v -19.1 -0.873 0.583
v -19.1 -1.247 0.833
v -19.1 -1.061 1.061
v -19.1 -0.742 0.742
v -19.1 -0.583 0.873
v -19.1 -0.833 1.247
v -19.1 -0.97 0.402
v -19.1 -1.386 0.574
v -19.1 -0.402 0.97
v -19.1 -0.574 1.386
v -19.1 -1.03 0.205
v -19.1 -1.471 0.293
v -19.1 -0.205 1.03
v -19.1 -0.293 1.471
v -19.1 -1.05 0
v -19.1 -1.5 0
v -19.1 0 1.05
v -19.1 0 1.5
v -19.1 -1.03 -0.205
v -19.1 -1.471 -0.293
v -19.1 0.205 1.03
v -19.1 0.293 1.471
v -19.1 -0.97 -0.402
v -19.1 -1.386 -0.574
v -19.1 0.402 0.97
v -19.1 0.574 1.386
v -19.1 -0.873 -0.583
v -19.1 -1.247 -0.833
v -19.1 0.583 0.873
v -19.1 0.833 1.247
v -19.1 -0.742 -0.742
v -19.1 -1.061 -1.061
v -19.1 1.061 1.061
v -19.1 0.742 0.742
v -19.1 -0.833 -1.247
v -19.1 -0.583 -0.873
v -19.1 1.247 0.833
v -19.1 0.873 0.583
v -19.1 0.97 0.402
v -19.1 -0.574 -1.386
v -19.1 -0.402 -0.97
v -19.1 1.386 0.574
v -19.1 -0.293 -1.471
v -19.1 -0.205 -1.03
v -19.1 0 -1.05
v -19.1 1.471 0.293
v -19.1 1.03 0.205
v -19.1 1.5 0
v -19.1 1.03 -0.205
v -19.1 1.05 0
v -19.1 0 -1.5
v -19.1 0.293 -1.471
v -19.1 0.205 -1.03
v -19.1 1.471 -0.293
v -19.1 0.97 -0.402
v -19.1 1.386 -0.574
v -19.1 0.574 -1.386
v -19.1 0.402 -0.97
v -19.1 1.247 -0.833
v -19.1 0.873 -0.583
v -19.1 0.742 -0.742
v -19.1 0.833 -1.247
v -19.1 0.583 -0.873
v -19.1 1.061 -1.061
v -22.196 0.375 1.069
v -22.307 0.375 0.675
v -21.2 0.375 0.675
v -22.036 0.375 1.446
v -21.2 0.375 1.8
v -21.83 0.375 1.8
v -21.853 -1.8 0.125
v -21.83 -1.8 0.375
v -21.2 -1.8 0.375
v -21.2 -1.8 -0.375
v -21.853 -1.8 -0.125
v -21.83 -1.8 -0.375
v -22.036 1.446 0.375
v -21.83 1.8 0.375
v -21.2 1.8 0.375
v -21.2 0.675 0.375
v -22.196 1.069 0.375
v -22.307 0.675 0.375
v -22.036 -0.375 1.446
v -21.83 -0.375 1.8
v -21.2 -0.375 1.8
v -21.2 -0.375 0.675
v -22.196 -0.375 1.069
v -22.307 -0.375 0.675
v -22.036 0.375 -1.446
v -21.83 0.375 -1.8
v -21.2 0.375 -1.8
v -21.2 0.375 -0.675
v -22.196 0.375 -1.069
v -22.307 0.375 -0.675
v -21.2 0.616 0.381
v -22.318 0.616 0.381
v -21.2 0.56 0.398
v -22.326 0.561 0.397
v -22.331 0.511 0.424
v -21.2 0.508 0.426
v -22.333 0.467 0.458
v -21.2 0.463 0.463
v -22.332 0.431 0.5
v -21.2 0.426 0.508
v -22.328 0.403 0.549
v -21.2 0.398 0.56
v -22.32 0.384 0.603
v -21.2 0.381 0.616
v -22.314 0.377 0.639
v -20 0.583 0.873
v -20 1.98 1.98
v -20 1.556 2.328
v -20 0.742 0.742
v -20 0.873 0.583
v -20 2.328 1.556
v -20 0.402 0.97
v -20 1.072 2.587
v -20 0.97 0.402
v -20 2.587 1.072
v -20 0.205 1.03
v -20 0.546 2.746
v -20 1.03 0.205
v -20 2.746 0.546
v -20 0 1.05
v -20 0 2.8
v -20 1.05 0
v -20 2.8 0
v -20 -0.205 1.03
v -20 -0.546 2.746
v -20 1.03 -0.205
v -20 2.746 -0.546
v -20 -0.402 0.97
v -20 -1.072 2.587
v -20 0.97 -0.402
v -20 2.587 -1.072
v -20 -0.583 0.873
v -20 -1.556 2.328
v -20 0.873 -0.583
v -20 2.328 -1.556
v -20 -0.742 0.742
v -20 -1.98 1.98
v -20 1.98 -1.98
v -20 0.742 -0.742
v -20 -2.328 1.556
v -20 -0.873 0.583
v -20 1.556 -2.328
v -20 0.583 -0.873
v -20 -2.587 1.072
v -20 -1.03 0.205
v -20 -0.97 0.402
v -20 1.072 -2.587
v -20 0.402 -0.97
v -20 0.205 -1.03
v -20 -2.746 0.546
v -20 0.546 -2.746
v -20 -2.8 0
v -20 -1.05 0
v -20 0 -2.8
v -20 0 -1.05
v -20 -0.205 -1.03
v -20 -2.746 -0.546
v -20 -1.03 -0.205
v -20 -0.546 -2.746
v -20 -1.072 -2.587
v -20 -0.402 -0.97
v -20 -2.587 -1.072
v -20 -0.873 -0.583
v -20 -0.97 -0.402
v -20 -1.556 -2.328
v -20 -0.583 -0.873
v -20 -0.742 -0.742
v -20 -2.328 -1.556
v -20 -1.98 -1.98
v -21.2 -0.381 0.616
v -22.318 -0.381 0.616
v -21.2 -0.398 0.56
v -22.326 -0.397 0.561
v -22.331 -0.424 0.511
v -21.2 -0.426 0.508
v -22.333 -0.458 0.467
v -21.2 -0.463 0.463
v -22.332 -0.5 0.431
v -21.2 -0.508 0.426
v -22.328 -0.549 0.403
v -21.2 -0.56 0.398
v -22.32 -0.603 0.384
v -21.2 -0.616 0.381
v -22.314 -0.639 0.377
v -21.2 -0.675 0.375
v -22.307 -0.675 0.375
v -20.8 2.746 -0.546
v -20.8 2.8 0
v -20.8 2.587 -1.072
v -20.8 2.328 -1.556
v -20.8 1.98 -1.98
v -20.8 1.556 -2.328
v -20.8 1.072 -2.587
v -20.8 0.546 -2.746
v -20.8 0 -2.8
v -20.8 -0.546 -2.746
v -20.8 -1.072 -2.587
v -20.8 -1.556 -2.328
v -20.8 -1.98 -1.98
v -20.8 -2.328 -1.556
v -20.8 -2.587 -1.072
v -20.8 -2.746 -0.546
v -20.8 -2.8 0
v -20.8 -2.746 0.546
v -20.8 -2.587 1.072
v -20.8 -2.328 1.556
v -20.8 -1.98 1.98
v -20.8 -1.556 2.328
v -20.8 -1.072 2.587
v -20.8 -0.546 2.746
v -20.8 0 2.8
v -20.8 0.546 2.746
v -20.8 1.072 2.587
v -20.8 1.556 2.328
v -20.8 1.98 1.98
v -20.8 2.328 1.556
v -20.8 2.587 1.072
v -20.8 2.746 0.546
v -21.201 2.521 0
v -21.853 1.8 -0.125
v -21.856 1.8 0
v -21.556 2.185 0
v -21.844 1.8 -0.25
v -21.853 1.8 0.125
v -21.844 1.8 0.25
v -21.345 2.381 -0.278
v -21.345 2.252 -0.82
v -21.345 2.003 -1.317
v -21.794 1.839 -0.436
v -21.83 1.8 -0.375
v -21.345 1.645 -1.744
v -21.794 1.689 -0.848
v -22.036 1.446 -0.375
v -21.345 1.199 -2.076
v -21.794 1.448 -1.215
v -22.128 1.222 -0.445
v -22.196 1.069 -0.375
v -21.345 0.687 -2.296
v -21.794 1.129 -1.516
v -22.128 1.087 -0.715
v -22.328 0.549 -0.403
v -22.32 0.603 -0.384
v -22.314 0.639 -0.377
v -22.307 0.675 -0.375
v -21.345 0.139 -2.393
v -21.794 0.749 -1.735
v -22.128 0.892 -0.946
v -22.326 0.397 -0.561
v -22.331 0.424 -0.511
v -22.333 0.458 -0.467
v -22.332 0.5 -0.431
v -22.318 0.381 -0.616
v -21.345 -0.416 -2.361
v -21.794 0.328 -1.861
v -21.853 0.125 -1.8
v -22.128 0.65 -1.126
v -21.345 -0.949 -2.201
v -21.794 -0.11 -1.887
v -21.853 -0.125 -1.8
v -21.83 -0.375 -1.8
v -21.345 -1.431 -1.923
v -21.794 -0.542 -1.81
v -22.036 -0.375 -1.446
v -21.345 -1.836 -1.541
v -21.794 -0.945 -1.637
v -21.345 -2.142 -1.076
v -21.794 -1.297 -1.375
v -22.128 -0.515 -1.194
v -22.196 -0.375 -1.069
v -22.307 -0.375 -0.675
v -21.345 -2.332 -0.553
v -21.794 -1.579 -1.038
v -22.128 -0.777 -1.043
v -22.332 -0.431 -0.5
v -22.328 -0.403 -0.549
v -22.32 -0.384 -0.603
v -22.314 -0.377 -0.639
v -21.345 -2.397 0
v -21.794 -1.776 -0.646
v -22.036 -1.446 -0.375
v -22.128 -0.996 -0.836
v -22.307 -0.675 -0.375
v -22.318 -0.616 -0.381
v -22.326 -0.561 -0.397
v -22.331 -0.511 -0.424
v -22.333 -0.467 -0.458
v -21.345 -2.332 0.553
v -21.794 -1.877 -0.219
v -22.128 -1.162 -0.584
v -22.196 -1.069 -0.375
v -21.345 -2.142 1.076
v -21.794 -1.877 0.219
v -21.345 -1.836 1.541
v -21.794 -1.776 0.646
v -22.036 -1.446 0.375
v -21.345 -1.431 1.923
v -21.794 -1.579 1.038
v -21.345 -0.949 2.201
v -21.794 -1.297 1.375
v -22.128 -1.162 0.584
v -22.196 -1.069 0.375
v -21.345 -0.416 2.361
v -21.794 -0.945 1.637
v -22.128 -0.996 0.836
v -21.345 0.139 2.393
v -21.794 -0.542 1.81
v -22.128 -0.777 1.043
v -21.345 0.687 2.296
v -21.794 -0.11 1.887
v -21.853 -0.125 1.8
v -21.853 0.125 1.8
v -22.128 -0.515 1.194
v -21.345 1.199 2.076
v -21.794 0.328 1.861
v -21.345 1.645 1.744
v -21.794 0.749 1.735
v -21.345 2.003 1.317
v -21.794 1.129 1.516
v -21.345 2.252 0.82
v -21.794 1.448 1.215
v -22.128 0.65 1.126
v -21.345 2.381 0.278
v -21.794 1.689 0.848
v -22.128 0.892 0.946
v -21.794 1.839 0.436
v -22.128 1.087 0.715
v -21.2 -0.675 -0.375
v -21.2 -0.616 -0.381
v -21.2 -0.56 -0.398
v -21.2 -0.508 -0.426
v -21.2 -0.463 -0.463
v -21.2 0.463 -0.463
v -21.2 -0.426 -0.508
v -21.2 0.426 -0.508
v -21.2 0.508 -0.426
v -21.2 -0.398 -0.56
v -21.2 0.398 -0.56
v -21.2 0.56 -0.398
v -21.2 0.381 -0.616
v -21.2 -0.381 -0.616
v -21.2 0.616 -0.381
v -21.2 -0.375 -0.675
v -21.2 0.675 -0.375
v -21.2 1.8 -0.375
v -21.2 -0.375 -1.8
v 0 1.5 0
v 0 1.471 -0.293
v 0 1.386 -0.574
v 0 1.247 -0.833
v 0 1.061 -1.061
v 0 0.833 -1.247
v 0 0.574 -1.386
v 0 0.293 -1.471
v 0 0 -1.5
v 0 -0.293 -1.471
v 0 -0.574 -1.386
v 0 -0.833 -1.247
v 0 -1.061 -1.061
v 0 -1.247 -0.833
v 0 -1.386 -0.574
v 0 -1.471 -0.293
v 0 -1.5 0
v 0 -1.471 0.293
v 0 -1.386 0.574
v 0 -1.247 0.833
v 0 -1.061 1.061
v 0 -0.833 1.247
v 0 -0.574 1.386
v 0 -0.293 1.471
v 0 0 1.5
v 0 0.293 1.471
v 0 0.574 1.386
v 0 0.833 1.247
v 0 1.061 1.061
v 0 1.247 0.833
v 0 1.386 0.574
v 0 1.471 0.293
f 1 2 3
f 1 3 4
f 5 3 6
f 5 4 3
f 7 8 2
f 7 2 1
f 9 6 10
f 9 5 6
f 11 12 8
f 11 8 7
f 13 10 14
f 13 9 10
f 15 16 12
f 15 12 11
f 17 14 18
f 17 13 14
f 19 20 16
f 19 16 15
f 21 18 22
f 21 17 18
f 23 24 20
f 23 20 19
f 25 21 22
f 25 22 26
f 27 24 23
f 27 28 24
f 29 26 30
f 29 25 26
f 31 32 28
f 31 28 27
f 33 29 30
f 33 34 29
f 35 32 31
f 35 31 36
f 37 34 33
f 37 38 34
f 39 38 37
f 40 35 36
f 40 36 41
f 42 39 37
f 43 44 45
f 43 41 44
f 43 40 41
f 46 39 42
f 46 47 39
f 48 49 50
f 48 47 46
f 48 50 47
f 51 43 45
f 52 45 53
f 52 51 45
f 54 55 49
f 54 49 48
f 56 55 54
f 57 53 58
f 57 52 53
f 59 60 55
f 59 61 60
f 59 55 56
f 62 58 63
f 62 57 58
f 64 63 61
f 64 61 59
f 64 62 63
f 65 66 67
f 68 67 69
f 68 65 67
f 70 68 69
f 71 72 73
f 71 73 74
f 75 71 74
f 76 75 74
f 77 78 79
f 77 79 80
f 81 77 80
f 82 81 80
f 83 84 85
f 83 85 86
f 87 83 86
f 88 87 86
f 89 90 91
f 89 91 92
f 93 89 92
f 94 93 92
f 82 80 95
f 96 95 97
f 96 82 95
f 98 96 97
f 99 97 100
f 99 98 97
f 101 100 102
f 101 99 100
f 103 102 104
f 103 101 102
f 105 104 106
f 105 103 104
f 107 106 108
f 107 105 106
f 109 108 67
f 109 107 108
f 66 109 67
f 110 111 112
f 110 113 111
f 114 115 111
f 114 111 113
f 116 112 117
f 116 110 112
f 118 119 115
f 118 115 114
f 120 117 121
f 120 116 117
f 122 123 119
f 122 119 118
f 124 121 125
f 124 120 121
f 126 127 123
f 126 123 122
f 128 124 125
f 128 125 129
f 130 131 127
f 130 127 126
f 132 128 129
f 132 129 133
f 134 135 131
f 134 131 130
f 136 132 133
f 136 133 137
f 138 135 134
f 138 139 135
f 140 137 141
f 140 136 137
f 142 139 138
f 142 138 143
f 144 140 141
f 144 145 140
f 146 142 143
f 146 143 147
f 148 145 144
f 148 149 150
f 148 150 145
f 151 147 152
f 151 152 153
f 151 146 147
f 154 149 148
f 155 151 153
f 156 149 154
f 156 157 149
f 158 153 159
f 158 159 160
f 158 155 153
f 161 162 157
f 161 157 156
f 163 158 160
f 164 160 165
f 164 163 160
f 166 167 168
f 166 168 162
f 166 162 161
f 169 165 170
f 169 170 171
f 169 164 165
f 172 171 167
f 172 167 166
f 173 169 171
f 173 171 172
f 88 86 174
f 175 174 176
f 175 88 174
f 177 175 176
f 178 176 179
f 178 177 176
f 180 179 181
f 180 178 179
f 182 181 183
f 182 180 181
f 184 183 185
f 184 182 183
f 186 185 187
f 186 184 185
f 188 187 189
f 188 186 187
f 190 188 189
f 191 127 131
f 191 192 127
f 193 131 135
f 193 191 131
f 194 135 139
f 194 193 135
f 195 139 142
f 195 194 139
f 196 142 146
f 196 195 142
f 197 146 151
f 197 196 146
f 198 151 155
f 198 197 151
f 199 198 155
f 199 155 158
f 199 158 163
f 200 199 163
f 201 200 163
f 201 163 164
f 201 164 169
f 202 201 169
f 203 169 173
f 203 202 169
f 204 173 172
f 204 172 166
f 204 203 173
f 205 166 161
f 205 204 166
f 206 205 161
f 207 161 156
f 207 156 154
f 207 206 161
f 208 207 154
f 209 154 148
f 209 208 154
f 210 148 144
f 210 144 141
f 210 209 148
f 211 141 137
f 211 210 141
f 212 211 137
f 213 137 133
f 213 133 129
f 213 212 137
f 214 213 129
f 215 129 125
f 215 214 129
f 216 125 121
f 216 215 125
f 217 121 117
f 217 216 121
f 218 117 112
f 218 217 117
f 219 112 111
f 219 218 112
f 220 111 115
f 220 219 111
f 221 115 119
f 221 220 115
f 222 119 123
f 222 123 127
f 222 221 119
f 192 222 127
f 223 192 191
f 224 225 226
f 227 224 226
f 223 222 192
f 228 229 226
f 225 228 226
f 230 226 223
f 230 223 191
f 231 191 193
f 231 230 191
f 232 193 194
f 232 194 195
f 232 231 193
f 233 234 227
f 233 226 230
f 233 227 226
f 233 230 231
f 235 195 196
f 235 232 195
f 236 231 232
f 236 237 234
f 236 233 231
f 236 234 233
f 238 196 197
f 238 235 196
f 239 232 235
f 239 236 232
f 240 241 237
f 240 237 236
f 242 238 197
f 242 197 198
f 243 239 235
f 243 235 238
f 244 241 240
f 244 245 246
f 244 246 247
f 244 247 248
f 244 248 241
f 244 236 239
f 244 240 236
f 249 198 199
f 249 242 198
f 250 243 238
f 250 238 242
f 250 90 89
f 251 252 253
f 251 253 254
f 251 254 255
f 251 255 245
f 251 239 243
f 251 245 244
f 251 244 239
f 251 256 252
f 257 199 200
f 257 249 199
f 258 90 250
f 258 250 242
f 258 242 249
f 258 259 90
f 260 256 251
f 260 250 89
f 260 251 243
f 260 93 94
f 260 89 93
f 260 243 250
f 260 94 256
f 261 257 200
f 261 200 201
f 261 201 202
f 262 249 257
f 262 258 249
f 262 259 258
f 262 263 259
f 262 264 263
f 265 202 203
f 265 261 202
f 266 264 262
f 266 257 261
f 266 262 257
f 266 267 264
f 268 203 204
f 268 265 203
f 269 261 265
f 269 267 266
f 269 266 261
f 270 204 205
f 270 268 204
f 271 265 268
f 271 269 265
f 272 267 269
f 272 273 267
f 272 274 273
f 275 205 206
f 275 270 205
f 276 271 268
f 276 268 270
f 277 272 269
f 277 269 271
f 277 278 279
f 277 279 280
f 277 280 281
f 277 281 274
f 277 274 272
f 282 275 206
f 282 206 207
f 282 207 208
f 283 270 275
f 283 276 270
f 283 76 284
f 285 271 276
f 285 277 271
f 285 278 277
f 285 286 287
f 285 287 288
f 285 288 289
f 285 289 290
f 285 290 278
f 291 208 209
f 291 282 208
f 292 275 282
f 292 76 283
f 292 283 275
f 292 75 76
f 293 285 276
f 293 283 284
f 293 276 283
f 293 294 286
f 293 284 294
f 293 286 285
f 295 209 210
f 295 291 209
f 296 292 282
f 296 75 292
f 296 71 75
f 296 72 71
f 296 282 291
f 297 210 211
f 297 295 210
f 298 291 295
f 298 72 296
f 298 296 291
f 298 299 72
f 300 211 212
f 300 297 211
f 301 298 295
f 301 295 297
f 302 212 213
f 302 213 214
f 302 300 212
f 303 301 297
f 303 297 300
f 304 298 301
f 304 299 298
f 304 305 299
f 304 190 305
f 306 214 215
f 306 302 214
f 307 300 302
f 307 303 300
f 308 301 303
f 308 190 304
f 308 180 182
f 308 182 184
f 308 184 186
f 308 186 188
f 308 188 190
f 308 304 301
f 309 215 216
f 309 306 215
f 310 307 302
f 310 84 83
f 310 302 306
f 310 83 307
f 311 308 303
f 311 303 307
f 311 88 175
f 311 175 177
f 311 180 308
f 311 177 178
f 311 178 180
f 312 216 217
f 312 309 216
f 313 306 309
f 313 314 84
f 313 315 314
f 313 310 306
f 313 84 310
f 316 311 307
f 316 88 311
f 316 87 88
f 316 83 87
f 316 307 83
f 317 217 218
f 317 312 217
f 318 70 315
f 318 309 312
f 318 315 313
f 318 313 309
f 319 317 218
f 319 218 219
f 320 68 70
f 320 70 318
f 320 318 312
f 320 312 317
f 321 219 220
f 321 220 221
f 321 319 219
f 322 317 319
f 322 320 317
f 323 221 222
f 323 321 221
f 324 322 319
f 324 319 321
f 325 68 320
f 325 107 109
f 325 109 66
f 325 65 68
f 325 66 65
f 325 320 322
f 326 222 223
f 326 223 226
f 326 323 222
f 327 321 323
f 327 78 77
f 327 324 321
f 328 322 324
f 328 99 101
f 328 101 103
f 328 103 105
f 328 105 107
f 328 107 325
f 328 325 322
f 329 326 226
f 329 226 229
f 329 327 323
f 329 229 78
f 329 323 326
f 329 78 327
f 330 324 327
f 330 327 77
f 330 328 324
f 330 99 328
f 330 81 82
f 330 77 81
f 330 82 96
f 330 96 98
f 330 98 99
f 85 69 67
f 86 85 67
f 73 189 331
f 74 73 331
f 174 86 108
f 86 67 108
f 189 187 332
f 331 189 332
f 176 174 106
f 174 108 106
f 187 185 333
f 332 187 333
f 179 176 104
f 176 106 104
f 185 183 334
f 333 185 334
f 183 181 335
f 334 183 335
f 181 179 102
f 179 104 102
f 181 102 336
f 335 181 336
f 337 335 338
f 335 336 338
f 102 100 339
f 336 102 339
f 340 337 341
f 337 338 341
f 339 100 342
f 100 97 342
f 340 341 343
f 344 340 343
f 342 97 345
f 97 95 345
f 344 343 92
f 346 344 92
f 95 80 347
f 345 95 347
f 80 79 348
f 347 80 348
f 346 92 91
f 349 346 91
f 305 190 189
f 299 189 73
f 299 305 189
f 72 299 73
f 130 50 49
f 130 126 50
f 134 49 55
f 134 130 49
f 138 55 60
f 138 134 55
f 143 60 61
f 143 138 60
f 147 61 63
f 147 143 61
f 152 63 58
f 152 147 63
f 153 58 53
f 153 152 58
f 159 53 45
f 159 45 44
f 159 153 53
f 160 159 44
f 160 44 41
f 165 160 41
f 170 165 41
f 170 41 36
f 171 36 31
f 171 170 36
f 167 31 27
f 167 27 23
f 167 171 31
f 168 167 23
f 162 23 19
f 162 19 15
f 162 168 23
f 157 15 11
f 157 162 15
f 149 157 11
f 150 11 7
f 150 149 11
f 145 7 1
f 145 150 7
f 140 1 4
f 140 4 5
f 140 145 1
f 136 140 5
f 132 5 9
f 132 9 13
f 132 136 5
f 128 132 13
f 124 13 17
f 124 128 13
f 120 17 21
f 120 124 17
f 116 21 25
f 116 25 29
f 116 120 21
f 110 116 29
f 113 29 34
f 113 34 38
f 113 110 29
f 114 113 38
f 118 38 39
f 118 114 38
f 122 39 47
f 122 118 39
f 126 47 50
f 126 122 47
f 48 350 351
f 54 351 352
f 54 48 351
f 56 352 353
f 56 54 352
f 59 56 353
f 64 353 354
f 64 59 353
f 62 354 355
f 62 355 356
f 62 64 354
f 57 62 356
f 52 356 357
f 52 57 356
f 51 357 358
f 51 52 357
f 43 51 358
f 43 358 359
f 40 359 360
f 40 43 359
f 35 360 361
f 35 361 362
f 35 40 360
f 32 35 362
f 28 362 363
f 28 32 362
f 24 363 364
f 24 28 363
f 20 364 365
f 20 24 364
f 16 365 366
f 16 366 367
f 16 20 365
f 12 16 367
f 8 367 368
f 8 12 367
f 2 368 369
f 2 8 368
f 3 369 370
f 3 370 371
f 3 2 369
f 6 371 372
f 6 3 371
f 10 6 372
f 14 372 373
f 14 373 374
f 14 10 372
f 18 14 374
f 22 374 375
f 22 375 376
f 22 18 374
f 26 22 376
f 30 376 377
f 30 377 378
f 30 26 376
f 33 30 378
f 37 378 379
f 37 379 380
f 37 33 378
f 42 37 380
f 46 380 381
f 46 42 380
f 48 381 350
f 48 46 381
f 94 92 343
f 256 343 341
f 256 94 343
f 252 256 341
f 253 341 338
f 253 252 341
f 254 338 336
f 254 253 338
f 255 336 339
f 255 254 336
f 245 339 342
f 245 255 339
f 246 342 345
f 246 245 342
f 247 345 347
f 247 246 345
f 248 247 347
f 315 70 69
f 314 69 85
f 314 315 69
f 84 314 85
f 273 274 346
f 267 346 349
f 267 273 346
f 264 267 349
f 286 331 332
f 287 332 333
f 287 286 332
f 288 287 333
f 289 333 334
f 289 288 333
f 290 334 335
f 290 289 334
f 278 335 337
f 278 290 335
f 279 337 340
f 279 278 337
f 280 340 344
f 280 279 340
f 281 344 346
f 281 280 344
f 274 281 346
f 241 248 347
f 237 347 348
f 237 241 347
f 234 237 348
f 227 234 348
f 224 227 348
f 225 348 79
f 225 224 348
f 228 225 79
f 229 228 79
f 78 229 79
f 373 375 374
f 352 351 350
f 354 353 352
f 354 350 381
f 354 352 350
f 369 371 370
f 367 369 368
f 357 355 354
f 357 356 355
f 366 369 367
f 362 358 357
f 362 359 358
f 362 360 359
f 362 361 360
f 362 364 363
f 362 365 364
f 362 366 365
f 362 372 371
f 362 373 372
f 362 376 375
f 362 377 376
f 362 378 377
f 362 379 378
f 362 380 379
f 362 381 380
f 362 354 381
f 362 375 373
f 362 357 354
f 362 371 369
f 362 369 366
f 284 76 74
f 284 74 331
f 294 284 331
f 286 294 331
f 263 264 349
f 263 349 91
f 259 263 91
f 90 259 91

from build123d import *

# Parameters (mm, degrees)
CUT_EXTRUDE_5_DEPTH = 1.2


with BuildPart() as part:
    # 草图2 → 旋转1 (revolve)
    with BuildSketch(Plane.XY):
        with BuildLine():
            Line((0, 0), (0, 1.5))
            Line((0, 1.5), (-19.1, 1.5))
            Line((-19.1, 1.5), (-19.1, 1.05))
            Line((-19.1, 1.05), (-20, 1.05))
            Line((-20, 1.05), (-20, 2.8))
            Line((-20, 2.8), (-20.8, 2.8))
            ThreePointArc((-20.8, 2.8), (-21.971790212, 1.61245155), (-22.4, 0))
            Line((-22.4, 0), (0, 0))
        make_face()
    revolve(axis=Axis((0, 0, 0), (-1, 0, 0)))

    # 草图3 → 切除-拉伸5 (cut)
    with BuildSketch(Plane(origin=(-22.4, 0, 0), x_dir=(0, 0, -1), z_dir=(1, 0, 0))):
        with BuildLine():
            Line((0.375, 1.8), (-0.375, 1.8))
            Line((-0.375, 1.8), (-0.375, 0.675))
            ThreePointArc((-0.375, 0.675), (-0.462867966, 0.462867966), (-0.675, 0.375))
            Line((-0.675, 0.375), (-1.8, 0.375))
            Line((-1.8, 0.375), (-1.8, -0.375))
            Line((-1.8, -0.375), (-0.675, -0.375))
            ThreePointArc((-0.675, -0.375), (-0.462867966, -0.462867966), (-0.375, -0.675))
            Line((-0.375, -0.675), (-0.375, -1.8))
            Line((-0.375, -1.8), (0.375, -1.8))
            Line((0.375, -1.8), (0.375, -0.675))
            ThreePointArc((0.375, -0.675), (0.462867966, -0.462867966), (0.675, -0.375))
            Line((0.675, -0.375), (1.8, -0.375))
            Line((1.8, -0.375), (1.8, 0.375))
            Line((1.8, 0.375), (0.675, 0.375))
            ThreePointArc((0.675, 0.375), (0.462867966, 0.462867966), (0.375, 0.675))
            Line((0.375, 0.675), (0.375, 1.8))
        make_face()
    extrude(amount=CUT_EXTRUDE_5_DEPTH, mode=Mode.SUBTRACT)


solid = part.part
